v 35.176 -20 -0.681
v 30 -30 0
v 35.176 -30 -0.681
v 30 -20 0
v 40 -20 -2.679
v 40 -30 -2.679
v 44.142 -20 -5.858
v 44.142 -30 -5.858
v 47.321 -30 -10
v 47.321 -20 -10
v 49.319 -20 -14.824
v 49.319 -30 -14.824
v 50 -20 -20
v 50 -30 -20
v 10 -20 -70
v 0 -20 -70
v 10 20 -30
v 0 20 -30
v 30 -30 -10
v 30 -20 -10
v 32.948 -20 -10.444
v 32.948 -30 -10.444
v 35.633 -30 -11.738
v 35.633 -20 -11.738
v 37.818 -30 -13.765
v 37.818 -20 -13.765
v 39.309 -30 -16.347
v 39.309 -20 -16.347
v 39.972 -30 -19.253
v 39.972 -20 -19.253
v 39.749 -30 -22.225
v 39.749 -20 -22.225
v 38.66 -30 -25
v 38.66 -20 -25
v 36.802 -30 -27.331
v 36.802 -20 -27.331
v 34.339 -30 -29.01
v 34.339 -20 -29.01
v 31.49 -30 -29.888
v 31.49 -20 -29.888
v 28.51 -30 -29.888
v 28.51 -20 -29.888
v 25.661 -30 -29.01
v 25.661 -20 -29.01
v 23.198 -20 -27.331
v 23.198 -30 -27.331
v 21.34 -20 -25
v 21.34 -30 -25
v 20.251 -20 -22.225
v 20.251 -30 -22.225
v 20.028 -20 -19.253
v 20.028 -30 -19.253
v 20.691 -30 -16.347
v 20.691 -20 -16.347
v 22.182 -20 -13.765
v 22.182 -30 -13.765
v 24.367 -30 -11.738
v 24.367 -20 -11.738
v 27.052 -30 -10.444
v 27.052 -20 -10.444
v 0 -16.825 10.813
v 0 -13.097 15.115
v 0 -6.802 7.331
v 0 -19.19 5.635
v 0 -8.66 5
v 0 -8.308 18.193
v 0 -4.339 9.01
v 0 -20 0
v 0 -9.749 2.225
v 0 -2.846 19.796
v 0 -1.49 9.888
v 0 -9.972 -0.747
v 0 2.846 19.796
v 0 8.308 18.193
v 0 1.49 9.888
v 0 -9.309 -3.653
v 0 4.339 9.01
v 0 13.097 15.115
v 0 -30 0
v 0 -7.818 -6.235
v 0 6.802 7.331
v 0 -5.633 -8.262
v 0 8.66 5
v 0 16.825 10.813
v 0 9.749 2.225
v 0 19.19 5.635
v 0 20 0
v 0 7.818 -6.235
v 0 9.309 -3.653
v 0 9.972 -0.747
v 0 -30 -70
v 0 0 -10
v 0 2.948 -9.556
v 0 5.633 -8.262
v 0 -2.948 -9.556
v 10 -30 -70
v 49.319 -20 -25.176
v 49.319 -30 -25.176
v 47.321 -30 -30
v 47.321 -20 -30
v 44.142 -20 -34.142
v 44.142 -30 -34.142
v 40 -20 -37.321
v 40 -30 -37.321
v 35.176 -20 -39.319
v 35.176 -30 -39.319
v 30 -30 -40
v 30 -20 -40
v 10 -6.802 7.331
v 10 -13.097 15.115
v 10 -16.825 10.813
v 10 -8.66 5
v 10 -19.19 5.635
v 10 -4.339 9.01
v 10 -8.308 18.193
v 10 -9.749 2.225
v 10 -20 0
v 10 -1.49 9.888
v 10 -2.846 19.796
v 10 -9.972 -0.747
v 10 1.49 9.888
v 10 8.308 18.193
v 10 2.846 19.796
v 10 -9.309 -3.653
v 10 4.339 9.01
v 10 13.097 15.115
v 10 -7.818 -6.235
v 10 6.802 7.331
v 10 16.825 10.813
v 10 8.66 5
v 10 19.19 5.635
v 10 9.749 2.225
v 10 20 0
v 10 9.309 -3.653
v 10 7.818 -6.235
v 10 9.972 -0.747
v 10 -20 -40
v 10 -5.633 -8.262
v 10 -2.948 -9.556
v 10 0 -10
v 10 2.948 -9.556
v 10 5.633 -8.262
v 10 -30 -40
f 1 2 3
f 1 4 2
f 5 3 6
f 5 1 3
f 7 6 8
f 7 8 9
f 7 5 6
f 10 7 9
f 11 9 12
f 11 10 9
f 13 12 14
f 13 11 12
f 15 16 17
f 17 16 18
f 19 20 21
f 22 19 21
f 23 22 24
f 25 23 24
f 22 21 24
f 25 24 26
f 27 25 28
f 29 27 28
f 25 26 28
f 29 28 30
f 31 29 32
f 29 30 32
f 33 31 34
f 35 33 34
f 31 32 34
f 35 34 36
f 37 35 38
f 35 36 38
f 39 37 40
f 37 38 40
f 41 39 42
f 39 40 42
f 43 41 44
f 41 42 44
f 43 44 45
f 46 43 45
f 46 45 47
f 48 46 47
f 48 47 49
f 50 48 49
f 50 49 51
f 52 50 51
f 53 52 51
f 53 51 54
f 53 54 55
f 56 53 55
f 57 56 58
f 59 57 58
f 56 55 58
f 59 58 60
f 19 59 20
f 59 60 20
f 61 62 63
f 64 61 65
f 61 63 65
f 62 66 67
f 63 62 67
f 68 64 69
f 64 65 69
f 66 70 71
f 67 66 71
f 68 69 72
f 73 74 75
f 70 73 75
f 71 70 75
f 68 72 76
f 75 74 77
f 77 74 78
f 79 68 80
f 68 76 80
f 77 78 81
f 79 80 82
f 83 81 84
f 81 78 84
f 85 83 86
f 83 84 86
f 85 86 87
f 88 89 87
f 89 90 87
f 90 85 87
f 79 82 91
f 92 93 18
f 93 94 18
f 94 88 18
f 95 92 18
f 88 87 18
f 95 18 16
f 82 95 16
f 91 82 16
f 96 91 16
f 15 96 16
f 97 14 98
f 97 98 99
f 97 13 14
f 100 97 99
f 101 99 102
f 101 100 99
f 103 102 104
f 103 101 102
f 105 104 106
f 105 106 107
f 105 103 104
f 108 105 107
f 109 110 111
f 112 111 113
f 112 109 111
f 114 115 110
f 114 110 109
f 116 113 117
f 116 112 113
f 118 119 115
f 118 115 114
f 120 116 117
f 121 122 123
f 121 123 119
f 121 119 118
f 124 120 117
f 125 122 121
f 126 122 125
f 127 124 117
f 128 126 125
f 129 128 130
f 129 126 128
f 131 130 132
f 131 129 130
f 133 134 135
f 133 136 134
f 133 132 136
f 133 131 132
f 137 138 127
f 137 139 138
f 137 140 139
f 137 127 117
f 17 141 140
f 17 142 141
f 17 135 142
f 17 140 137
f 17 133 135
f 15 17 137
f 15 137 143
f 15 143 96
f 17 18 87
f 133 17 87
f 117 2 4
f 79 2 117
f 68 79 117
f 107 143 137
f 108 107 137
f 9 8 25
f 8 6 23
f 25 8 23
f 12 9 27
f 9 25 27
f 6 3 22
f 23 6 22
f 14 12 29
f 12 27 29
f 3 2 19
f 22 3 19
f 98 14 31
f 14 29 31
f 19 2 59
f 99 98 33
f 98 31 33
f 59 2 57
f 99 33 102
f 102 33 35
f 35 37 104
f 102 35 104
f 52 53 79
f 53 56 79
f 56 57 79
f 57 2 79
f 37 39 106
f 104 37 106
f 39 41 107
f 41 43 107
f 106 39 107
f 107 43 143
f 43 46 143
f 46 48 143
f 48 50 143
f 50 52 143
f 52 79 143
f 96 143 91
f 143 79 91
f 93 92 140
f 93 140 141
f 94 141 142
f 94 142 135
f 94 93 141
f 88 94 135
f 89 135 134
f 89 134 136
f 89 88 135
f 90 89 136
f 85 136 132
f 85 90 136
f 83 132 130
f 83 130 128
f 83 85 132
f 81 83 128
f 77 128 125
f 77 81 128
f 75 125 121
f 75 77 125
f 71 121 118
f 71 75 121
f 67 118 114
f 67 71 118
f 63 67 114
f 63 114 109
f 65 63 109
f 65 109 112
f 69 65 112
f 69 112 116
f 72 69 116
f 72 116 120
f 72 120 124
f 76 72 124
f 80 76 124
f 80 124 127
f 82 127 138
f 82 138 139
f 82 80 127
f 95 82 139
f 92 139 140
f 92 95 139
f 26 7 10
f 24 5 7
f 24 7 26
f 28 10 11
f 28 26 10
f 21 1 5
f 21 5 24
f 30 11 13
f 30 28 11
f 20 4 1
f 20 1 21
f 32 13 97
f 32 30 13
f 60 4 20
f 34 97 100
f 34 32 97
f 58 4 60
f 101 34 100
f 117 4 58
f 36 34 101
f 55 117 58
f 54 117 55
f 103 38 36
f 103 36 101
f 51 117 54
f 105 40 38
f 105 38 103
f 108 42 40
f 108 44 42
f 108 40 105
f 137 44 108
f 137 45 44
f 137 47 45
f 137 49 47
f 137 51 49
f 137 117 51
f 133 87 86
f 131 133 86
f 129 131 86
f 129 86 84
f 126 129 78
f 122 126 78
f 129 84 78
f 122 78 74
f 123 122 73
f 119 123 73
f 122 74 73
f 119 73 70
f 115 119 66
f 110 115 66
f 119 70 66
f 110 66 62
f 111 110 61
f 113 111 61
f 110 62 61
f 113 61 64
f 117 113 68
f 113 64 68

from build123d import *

# Parameters (mm, degrees)
SKETCH1_R           = 10
BOSS_EXTRUDE1_DEPTH = 10
SKETCH1_3_W         = 40
SKETCH1_3_H         = 10
BOSS_EXTRUDE2_DEPTH = 50
FILLET1_R           = 20
SKETCH2_R           = 10
CUT_EXTRUDE1_DEPTH  = 10


with BuildPart() as part:
    # Sketch1 → Boss-Extrude1 (new body)
    with BuildSketch(Plane(origin=(0, 0, 0), x_dir=(0, 0, -1), z_dir=(1, 0, 0))):
        with BuildLine():
            ThreePointArc((0, 20), (-20, 0), (0, -20))
            Line((0, -20), (40, -20))
            Line((40, -20), (40, -30))
            Line((40, -30), (70, -30))
            Line((70, -30), (70, -20))
            Line((70, -20), (30, 20))
            Line((30, 20), (0, 20))
        make_face()
        Circle(SKETCH1_R, mode=Mode.SUBTRACT)
    extrude(amount=BOSS_EXTRUDE1_DEPTH)

    # Sketch1<3> → Boss-Extrude2 (add)
    with BuildSketch(Plane(origin=(0, 0, 0), x_dir=(0, 0, -1), z_dir=(1, 0, 0))):
        with Locations((20, -25)):
            Rectangle(SKETCH1_3_W, SKETCH1_3_H)
    extrude(amount=BOSS_EXTRUDE2_DEPTH)

    # Fillet1
    fillet1_edges = [part.edges().sort_by_distance(p)[0] for p in [
        (50, -25, -40),
        (50, -25, 0),
    ]]
    fillet(fillet1_edges, radius=FILLET1_R - 0.0001)  # a hair under: the kernel refuses the full size

    # Sketch2 → Cut-Extrude1 (cut)
    with BuildSketch(Plane(origin=(0, -20, 0), x_dir=(1, 0, 0), z_dir=(0, 1, 0))):
        with Locations(Location((30, 20, 0), (0, 0, 270))):
            Circle(SKETCH2_R)
    extrude(amount=-CUT_EXTRUDE1_DEPTH, mode=Mode.SUBTRACT)


solid = part.part
